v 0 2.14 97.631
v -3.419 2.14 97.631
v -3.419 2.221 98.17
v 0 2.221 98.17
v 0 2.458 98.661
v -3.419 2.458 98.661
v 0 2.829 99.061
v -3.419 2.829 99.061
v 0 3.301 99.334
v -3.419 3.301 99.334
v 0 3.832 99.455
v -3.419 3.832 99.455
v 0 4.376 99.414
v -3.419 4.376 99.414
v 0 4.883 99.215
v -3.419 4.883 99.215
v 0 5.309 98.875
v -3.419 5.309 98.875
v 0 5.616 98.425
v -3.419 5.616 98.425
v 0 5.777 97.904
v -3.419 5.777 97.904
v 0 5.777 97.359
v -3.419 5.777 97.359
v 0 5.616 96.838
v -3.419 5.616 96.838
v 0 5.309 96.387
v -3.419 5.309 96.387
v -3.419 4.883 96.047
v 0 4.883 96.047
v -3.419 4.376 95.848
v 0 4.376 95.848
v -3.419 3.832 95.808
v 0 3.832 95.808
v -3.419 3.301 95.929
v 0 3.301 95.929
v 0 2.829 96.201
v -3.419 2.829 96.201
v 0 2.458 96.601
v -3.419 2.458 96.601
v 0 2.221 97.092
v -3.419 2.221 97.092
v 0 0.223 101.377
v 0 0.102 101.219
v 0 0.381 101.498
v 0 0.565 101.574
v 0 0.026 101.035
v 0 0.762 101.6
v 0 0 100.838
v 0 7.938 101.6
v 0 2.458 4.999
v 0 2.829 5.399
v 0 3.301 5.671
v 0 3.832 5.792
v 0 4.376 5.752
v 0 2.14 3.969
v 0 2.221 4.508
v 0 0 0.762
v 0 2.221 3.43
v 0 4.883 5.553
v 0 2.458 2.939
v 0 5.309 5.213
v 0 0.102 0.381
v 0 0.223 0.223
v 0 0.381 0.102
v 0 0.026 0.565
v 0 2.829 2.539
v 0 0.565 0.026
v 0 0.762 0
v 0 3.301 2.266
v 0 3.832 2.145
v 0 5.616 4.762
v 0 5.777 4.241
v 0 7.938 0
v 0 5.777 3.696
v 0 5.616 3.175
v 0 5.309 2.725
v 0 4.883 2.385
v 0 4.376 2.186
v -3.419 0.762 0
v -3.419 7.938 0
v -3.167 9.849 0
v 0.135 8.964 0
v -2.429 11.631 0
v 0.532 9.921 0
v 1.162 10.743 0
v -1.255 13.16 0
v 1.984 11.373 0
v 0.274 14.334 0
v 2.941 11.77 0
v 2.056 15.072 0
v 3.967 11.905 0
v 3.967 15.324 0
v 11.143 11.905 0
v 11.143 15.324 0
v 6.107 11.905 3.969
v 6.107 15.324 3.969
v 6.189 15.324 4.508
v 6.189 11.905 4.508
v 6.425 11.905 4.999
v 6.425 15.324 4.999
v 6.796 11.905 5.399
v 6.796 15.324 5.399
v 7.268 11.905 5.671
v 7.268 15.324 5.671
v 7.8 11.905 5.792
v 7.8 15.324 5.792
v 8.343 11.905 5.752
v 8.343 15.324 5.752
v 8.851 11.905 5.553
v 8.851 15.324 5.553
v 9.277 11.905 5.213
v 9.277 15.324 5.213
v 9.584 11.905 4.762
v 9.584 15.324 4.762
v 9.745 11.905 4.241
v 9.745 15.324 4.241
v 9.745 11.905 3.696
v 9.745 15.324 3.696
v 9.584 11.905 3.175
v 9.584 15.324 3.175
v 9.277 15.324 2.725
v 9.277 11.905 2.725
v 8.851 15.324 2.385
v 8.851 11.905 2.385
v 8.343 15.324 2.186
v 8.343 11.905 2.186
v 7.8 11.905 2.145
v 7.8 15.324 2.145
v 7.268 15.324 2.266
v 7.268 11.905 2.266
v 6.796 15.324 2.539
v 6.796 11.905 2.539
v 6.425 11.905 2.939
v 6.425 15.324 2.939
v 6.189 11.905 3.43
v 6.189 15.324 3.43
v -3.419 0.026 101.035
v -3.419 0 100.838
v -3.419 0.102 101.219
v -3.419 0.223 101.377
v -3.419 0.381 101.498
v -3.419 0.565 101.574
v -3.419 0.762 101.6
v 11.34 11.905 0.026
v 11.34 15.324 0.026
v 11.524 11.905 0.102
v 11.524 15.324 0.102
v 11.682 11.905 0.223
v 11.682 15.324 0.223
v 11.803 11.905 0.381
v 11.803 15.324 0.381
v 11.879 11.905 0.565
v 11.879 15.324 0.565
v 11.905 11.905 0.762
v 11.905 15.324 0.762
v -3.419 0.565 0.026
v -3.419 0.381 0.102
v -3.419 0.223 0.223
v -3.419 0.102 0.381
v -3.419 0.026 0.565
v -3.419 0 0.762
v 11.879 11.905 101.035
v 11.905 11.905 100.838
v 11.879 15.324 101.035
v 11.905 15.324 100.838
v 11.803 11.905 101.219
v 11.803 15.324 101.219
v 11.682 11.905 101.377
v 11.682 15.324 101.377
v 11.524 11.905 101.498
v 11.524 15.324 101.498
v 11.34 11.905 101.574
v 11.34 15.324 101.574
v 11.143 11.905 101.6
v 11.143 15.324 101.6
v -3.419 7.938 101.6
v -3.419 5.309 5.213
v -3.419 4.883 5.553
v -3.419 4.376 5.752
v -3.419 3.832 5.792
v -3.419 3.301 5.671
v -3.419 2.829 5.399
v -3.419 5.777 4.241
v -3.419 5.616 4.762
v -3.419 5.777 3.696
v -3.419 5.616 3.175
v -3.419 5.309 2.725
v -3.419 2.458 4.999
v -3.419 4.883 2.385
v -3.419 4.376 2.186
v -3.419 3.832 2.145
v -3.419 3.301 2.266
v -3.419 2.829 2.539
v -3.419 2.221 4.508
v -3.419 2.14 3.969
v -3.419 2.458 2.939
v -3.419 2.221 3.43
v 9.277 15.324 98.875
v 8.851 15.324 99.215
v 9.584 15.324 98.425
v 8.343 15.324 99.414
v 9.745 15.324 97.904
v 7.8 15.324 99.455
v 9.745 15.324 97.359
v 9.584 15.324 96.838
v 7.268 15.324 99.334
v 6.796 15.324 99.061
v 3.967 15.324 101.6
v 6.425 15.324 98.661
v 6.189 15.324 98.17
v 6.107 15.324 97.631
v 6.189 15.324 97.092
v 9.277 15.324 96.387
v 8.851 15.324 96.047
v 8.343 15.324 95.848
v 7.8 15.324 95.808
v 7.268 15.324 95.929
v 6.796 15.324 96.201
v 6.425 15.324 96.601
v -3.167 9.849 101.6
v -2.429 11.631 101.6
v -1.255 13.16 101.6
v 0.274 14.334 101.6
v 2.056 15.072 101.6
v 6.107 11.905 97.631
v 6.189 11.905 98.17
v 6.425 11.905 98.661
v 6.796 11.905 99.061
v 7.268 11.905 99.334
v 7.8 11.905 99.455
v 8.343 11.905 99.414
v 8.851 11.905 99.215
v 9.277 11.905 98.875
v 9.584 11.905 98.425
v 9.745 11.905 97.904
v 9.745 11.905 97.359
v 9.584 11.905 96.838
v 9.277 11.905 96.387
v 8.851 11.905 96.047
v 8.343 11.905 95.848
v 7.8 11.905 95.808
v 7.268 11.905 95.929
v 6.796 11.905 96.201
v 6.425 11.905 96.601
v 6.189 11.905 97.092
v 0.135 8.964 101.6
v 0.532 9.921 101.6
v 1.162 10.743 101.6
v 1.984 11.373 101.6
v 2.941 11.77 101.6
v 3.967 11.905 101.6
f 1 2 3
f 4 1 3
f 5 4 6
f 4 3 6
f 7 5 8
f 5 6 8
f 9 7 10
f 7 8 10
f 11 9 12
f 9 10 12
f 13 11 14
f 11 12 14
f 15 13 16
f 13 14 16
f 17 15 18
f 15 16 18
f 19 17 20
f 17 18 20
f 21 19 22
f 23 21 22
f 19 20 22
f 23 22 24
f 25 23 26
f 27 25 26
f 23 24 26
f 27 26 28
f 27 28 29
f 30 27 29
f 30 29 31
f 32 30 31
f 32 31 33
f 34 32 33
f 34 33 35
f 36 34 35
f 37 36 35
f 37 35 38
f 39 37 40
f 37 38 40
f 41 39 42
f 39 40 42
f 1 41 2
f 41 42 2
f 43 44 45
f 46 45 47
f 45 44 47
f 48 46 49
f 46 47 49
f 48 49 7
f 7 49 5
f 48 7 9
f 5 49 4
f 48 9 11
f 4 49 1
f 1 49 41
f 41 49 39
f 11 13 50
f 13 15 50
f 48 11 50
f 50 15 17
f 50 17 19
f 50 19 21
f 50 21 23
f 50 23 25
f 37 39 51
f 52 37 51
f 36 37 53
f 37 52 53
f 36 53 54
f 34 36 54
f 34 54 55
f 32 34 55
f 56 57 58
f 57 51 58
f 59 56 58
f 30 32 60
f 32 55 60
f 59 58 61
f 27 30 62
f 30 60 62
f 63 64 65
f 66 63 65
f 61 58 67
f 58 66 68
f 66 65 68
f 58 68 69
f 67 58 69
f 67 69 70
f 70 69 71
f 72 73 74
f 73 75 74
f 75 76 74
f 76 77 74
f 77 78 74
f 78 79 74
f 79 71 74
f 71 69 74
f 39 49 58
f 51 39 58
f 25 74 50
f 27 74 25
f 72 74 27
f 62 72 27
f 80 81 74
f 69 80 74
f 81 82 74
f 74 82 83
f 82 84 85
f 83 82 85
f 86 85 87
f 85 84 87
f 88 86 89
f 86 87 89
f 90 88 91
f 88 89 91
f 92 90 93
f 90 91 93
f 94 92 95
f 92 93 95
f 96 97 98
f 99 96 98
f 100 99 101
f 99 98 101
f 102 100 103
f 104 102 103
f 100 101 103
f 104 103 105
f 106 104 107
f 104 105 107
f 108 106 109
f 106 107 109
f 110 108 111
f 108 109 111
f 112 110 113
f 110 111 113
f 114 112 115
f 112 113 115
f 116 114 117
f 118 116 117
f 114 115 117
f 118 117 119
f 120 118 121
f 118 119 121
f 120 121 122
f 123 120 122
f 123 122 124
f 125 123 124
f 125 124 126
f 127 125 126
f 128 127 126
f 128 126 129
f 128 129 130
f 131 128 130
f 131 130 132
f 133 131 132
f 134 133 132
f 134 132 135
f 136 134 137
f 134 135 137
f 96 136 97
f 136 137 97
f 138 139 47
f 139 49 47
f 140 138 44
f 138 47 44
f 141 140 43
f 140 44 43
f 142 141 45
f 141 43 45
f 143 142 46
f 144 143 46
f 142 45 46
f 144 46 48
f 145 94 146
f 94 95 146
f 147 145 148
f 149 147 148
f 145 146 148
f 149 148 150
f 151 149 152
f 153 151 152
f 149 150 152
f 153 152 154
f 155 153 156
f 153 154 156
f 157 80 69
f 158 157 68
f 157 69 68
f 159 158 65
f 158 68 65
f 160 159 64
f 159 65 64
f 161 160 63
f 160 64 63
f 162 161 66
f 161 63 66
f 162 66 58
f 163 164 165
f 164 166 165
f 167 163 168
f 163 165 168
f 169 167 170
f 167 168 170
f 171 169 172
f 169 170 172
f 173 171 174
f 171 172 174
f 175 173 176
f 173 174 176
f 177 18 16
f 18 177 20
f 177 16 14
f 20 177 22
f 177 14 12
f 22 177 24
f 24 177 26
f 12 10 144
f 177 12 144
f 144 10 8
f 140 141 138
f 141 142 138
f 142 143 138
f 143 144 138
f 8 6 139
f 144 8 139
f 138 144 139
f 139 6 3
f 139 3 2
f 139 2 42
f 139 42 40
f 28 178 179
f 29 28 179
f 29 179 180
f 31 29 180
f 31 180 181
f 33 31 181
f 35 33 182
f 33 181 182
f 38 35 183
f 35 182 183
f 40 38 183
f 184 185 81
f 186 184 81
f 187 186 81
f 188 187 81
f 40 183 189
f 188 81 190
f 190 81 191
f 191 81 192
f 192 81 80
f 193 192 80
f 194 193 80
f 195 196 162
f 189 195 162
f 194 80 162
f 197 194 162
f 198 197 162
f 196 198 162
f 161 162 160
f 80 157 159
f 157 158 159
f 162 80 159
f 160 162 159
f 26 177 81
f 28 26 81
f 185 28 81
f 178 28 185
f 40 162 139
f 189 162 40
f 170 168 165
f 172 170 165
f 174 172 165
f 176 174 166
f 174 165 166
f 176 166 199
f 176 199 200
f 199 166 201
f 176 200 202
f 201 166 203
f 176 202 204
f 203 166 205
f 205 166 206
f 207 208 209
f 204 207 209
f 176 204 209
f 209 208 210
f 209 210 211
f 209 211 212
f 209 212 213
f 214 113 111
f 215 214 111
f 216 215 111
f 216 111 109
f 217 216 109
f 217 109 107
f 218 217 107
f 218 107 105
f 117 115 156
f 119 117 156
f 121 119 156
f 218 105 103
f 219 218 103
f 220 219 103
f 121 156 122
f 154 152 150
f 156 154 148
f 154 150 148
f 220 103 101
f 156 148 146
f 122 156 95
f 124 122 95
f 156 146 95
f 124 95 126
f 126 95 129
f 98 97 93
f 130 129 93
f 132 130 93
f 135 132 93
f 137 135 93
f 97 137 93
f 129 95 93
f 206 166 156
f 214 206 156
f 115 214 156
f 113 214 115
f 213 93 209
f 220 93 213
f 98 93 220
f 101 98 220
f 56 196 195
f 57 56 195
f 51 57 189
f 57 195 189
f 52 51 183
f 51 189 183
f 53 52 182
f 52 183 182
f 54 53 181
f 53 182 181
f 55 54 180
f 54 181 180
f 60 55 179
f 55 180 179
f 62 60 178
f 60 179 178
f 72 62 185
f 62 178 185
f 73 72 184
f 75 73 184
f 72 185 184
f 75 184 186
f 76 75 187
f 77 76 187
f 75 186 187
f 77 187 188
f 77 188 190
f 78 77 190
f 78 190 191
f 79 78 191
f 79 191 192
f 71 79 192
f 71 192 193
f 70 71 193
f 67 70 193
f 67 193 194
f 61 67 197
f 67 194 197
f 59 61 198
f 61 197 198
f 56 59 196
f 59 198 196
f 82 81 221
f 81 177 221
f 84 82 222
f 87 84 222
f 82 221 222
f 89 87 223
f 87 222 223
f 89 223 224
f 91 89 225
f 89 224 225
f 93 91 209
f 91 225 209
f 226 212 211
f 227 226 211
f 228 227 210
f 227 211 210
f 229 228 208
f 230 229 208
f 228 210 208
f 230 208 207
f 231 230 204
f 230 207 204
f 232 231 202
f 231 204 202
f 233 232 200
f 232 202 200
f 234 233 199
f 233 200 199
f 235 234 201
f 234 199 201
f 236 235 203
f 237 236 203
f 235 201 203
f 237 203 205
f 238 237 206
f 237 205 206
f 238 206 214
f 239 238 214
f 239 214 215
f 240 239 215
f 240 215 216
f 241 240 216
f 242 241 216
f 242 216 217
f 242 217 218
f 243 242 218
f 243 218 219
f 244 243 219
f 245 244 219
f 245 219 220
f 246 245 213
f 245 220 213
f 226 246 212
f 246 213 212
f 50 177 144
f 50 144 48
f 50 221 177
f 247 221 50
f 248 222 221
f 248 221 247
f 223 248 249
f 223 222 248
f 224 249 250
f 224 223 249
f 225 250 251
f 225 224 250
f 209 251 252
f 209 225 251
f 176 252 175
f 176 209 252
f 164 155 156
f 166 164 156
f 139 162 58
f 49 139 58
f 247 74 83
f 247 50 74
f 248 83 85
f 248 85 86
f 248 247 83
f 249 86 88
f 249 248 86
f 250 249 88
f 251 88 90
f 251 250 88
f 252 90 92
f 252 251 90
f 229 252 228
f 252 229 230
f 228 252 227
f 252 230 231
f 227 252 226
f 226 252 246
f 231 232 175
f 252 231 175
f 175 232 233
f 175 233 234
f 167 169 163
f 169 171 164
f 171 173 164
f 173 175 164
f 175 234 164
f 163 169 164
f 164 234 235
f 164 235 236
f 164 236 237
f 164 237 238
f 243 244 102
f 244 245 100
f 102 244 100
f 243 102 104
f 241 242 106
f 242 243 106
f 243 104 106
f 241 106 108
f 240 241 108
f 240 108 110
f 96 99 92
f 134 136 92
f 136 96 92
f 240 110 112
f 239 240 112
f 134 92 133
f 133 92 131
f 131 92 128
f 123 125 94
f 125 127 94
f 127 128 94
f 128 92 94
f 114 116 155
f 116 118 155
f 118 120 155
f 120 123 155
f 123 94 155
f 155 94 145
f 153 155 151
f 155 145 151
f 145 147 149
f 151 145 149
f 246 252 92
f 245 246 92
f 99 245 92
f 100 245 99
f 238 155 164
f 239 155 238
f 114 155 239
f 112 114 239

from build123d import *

# Parameters (mm, degrees)
F1_DEPTH = 101.6
F2_R     = 3.96748
F3_R     = 7.38632
F4_R     = 1.8288
F5_DEPTH = 3.41884
F6_R     = 1.8288
F7_DEPTH = 3.41884
F8_R     = 0.762


with BuildPart() as f1:
    # F0 (on Top) → F1 (new body)
    with BuildSketch(Plane.XY):
        Polygon((-3.41884, 0), (0, 0), (0, 11.90498), (11.90498, 11.90498), (11.90498, 15.32382), (-3.41884, 15.32382), align=None)
    extrude(amount=F1_DEPTH)

    # F2
    f2_edges = [f1.edges().sort_by_distance(p)[0] for p in [
        (0, 11.90498, 50.8),
    ]]
    fillet(f2_edges, radius=F2_R)

    # F3
    f3_edges = [f1.edges().sort_by_distance(p)[0] for p in [
        (-3.41884, 15.32382, 50.8),
    ]]
    fillet(f3_edges, radius=F3_R)

    # F4 (on face) → F5 (cut, through all)
    with BuildSketch(Plane(origin=(0, 15.32382, 0), x_dir=(-1, 0, 0), z_dir=(0, 1, 0))):
        with Locations((-7.93623, 97.63125)):
            Circle(F4_R)
        with Locations((-7.93623, 3.96875)):
            Circle(F4_R)
    extrude(amount=-F5_DEPTH, mode=Mode.SUBTRACT)

    # F6 (on face) → F7 (cut, through all)
    with BuildSketch(Plane(origin=(-3.41884, 0, 0), x_dir=(0, -1, 0), z_dir=(-1, 0, 0))):
        with Locations((-3.96875, 97.63125)):
            Circle(F6_R)
        with Locations((-3.96875, 3.96875)):
            Circle(F6_R)
    extrude(amount=-F7_DEPTH, mode=Mode.SUBTRACT)

    # F8
    f8_edges = [f1.edges().sort_by_distance(p)[0] for p in [
        (-1.70942, 0, 101.6),
        (11.90498, 13.6144, 101.6),
        (11.90498, 13.6144, 0),
        (-1.70942, 0, 0),
    ]]
    fillet(f8_edges, radius=F8_R)


solid = f1.part
